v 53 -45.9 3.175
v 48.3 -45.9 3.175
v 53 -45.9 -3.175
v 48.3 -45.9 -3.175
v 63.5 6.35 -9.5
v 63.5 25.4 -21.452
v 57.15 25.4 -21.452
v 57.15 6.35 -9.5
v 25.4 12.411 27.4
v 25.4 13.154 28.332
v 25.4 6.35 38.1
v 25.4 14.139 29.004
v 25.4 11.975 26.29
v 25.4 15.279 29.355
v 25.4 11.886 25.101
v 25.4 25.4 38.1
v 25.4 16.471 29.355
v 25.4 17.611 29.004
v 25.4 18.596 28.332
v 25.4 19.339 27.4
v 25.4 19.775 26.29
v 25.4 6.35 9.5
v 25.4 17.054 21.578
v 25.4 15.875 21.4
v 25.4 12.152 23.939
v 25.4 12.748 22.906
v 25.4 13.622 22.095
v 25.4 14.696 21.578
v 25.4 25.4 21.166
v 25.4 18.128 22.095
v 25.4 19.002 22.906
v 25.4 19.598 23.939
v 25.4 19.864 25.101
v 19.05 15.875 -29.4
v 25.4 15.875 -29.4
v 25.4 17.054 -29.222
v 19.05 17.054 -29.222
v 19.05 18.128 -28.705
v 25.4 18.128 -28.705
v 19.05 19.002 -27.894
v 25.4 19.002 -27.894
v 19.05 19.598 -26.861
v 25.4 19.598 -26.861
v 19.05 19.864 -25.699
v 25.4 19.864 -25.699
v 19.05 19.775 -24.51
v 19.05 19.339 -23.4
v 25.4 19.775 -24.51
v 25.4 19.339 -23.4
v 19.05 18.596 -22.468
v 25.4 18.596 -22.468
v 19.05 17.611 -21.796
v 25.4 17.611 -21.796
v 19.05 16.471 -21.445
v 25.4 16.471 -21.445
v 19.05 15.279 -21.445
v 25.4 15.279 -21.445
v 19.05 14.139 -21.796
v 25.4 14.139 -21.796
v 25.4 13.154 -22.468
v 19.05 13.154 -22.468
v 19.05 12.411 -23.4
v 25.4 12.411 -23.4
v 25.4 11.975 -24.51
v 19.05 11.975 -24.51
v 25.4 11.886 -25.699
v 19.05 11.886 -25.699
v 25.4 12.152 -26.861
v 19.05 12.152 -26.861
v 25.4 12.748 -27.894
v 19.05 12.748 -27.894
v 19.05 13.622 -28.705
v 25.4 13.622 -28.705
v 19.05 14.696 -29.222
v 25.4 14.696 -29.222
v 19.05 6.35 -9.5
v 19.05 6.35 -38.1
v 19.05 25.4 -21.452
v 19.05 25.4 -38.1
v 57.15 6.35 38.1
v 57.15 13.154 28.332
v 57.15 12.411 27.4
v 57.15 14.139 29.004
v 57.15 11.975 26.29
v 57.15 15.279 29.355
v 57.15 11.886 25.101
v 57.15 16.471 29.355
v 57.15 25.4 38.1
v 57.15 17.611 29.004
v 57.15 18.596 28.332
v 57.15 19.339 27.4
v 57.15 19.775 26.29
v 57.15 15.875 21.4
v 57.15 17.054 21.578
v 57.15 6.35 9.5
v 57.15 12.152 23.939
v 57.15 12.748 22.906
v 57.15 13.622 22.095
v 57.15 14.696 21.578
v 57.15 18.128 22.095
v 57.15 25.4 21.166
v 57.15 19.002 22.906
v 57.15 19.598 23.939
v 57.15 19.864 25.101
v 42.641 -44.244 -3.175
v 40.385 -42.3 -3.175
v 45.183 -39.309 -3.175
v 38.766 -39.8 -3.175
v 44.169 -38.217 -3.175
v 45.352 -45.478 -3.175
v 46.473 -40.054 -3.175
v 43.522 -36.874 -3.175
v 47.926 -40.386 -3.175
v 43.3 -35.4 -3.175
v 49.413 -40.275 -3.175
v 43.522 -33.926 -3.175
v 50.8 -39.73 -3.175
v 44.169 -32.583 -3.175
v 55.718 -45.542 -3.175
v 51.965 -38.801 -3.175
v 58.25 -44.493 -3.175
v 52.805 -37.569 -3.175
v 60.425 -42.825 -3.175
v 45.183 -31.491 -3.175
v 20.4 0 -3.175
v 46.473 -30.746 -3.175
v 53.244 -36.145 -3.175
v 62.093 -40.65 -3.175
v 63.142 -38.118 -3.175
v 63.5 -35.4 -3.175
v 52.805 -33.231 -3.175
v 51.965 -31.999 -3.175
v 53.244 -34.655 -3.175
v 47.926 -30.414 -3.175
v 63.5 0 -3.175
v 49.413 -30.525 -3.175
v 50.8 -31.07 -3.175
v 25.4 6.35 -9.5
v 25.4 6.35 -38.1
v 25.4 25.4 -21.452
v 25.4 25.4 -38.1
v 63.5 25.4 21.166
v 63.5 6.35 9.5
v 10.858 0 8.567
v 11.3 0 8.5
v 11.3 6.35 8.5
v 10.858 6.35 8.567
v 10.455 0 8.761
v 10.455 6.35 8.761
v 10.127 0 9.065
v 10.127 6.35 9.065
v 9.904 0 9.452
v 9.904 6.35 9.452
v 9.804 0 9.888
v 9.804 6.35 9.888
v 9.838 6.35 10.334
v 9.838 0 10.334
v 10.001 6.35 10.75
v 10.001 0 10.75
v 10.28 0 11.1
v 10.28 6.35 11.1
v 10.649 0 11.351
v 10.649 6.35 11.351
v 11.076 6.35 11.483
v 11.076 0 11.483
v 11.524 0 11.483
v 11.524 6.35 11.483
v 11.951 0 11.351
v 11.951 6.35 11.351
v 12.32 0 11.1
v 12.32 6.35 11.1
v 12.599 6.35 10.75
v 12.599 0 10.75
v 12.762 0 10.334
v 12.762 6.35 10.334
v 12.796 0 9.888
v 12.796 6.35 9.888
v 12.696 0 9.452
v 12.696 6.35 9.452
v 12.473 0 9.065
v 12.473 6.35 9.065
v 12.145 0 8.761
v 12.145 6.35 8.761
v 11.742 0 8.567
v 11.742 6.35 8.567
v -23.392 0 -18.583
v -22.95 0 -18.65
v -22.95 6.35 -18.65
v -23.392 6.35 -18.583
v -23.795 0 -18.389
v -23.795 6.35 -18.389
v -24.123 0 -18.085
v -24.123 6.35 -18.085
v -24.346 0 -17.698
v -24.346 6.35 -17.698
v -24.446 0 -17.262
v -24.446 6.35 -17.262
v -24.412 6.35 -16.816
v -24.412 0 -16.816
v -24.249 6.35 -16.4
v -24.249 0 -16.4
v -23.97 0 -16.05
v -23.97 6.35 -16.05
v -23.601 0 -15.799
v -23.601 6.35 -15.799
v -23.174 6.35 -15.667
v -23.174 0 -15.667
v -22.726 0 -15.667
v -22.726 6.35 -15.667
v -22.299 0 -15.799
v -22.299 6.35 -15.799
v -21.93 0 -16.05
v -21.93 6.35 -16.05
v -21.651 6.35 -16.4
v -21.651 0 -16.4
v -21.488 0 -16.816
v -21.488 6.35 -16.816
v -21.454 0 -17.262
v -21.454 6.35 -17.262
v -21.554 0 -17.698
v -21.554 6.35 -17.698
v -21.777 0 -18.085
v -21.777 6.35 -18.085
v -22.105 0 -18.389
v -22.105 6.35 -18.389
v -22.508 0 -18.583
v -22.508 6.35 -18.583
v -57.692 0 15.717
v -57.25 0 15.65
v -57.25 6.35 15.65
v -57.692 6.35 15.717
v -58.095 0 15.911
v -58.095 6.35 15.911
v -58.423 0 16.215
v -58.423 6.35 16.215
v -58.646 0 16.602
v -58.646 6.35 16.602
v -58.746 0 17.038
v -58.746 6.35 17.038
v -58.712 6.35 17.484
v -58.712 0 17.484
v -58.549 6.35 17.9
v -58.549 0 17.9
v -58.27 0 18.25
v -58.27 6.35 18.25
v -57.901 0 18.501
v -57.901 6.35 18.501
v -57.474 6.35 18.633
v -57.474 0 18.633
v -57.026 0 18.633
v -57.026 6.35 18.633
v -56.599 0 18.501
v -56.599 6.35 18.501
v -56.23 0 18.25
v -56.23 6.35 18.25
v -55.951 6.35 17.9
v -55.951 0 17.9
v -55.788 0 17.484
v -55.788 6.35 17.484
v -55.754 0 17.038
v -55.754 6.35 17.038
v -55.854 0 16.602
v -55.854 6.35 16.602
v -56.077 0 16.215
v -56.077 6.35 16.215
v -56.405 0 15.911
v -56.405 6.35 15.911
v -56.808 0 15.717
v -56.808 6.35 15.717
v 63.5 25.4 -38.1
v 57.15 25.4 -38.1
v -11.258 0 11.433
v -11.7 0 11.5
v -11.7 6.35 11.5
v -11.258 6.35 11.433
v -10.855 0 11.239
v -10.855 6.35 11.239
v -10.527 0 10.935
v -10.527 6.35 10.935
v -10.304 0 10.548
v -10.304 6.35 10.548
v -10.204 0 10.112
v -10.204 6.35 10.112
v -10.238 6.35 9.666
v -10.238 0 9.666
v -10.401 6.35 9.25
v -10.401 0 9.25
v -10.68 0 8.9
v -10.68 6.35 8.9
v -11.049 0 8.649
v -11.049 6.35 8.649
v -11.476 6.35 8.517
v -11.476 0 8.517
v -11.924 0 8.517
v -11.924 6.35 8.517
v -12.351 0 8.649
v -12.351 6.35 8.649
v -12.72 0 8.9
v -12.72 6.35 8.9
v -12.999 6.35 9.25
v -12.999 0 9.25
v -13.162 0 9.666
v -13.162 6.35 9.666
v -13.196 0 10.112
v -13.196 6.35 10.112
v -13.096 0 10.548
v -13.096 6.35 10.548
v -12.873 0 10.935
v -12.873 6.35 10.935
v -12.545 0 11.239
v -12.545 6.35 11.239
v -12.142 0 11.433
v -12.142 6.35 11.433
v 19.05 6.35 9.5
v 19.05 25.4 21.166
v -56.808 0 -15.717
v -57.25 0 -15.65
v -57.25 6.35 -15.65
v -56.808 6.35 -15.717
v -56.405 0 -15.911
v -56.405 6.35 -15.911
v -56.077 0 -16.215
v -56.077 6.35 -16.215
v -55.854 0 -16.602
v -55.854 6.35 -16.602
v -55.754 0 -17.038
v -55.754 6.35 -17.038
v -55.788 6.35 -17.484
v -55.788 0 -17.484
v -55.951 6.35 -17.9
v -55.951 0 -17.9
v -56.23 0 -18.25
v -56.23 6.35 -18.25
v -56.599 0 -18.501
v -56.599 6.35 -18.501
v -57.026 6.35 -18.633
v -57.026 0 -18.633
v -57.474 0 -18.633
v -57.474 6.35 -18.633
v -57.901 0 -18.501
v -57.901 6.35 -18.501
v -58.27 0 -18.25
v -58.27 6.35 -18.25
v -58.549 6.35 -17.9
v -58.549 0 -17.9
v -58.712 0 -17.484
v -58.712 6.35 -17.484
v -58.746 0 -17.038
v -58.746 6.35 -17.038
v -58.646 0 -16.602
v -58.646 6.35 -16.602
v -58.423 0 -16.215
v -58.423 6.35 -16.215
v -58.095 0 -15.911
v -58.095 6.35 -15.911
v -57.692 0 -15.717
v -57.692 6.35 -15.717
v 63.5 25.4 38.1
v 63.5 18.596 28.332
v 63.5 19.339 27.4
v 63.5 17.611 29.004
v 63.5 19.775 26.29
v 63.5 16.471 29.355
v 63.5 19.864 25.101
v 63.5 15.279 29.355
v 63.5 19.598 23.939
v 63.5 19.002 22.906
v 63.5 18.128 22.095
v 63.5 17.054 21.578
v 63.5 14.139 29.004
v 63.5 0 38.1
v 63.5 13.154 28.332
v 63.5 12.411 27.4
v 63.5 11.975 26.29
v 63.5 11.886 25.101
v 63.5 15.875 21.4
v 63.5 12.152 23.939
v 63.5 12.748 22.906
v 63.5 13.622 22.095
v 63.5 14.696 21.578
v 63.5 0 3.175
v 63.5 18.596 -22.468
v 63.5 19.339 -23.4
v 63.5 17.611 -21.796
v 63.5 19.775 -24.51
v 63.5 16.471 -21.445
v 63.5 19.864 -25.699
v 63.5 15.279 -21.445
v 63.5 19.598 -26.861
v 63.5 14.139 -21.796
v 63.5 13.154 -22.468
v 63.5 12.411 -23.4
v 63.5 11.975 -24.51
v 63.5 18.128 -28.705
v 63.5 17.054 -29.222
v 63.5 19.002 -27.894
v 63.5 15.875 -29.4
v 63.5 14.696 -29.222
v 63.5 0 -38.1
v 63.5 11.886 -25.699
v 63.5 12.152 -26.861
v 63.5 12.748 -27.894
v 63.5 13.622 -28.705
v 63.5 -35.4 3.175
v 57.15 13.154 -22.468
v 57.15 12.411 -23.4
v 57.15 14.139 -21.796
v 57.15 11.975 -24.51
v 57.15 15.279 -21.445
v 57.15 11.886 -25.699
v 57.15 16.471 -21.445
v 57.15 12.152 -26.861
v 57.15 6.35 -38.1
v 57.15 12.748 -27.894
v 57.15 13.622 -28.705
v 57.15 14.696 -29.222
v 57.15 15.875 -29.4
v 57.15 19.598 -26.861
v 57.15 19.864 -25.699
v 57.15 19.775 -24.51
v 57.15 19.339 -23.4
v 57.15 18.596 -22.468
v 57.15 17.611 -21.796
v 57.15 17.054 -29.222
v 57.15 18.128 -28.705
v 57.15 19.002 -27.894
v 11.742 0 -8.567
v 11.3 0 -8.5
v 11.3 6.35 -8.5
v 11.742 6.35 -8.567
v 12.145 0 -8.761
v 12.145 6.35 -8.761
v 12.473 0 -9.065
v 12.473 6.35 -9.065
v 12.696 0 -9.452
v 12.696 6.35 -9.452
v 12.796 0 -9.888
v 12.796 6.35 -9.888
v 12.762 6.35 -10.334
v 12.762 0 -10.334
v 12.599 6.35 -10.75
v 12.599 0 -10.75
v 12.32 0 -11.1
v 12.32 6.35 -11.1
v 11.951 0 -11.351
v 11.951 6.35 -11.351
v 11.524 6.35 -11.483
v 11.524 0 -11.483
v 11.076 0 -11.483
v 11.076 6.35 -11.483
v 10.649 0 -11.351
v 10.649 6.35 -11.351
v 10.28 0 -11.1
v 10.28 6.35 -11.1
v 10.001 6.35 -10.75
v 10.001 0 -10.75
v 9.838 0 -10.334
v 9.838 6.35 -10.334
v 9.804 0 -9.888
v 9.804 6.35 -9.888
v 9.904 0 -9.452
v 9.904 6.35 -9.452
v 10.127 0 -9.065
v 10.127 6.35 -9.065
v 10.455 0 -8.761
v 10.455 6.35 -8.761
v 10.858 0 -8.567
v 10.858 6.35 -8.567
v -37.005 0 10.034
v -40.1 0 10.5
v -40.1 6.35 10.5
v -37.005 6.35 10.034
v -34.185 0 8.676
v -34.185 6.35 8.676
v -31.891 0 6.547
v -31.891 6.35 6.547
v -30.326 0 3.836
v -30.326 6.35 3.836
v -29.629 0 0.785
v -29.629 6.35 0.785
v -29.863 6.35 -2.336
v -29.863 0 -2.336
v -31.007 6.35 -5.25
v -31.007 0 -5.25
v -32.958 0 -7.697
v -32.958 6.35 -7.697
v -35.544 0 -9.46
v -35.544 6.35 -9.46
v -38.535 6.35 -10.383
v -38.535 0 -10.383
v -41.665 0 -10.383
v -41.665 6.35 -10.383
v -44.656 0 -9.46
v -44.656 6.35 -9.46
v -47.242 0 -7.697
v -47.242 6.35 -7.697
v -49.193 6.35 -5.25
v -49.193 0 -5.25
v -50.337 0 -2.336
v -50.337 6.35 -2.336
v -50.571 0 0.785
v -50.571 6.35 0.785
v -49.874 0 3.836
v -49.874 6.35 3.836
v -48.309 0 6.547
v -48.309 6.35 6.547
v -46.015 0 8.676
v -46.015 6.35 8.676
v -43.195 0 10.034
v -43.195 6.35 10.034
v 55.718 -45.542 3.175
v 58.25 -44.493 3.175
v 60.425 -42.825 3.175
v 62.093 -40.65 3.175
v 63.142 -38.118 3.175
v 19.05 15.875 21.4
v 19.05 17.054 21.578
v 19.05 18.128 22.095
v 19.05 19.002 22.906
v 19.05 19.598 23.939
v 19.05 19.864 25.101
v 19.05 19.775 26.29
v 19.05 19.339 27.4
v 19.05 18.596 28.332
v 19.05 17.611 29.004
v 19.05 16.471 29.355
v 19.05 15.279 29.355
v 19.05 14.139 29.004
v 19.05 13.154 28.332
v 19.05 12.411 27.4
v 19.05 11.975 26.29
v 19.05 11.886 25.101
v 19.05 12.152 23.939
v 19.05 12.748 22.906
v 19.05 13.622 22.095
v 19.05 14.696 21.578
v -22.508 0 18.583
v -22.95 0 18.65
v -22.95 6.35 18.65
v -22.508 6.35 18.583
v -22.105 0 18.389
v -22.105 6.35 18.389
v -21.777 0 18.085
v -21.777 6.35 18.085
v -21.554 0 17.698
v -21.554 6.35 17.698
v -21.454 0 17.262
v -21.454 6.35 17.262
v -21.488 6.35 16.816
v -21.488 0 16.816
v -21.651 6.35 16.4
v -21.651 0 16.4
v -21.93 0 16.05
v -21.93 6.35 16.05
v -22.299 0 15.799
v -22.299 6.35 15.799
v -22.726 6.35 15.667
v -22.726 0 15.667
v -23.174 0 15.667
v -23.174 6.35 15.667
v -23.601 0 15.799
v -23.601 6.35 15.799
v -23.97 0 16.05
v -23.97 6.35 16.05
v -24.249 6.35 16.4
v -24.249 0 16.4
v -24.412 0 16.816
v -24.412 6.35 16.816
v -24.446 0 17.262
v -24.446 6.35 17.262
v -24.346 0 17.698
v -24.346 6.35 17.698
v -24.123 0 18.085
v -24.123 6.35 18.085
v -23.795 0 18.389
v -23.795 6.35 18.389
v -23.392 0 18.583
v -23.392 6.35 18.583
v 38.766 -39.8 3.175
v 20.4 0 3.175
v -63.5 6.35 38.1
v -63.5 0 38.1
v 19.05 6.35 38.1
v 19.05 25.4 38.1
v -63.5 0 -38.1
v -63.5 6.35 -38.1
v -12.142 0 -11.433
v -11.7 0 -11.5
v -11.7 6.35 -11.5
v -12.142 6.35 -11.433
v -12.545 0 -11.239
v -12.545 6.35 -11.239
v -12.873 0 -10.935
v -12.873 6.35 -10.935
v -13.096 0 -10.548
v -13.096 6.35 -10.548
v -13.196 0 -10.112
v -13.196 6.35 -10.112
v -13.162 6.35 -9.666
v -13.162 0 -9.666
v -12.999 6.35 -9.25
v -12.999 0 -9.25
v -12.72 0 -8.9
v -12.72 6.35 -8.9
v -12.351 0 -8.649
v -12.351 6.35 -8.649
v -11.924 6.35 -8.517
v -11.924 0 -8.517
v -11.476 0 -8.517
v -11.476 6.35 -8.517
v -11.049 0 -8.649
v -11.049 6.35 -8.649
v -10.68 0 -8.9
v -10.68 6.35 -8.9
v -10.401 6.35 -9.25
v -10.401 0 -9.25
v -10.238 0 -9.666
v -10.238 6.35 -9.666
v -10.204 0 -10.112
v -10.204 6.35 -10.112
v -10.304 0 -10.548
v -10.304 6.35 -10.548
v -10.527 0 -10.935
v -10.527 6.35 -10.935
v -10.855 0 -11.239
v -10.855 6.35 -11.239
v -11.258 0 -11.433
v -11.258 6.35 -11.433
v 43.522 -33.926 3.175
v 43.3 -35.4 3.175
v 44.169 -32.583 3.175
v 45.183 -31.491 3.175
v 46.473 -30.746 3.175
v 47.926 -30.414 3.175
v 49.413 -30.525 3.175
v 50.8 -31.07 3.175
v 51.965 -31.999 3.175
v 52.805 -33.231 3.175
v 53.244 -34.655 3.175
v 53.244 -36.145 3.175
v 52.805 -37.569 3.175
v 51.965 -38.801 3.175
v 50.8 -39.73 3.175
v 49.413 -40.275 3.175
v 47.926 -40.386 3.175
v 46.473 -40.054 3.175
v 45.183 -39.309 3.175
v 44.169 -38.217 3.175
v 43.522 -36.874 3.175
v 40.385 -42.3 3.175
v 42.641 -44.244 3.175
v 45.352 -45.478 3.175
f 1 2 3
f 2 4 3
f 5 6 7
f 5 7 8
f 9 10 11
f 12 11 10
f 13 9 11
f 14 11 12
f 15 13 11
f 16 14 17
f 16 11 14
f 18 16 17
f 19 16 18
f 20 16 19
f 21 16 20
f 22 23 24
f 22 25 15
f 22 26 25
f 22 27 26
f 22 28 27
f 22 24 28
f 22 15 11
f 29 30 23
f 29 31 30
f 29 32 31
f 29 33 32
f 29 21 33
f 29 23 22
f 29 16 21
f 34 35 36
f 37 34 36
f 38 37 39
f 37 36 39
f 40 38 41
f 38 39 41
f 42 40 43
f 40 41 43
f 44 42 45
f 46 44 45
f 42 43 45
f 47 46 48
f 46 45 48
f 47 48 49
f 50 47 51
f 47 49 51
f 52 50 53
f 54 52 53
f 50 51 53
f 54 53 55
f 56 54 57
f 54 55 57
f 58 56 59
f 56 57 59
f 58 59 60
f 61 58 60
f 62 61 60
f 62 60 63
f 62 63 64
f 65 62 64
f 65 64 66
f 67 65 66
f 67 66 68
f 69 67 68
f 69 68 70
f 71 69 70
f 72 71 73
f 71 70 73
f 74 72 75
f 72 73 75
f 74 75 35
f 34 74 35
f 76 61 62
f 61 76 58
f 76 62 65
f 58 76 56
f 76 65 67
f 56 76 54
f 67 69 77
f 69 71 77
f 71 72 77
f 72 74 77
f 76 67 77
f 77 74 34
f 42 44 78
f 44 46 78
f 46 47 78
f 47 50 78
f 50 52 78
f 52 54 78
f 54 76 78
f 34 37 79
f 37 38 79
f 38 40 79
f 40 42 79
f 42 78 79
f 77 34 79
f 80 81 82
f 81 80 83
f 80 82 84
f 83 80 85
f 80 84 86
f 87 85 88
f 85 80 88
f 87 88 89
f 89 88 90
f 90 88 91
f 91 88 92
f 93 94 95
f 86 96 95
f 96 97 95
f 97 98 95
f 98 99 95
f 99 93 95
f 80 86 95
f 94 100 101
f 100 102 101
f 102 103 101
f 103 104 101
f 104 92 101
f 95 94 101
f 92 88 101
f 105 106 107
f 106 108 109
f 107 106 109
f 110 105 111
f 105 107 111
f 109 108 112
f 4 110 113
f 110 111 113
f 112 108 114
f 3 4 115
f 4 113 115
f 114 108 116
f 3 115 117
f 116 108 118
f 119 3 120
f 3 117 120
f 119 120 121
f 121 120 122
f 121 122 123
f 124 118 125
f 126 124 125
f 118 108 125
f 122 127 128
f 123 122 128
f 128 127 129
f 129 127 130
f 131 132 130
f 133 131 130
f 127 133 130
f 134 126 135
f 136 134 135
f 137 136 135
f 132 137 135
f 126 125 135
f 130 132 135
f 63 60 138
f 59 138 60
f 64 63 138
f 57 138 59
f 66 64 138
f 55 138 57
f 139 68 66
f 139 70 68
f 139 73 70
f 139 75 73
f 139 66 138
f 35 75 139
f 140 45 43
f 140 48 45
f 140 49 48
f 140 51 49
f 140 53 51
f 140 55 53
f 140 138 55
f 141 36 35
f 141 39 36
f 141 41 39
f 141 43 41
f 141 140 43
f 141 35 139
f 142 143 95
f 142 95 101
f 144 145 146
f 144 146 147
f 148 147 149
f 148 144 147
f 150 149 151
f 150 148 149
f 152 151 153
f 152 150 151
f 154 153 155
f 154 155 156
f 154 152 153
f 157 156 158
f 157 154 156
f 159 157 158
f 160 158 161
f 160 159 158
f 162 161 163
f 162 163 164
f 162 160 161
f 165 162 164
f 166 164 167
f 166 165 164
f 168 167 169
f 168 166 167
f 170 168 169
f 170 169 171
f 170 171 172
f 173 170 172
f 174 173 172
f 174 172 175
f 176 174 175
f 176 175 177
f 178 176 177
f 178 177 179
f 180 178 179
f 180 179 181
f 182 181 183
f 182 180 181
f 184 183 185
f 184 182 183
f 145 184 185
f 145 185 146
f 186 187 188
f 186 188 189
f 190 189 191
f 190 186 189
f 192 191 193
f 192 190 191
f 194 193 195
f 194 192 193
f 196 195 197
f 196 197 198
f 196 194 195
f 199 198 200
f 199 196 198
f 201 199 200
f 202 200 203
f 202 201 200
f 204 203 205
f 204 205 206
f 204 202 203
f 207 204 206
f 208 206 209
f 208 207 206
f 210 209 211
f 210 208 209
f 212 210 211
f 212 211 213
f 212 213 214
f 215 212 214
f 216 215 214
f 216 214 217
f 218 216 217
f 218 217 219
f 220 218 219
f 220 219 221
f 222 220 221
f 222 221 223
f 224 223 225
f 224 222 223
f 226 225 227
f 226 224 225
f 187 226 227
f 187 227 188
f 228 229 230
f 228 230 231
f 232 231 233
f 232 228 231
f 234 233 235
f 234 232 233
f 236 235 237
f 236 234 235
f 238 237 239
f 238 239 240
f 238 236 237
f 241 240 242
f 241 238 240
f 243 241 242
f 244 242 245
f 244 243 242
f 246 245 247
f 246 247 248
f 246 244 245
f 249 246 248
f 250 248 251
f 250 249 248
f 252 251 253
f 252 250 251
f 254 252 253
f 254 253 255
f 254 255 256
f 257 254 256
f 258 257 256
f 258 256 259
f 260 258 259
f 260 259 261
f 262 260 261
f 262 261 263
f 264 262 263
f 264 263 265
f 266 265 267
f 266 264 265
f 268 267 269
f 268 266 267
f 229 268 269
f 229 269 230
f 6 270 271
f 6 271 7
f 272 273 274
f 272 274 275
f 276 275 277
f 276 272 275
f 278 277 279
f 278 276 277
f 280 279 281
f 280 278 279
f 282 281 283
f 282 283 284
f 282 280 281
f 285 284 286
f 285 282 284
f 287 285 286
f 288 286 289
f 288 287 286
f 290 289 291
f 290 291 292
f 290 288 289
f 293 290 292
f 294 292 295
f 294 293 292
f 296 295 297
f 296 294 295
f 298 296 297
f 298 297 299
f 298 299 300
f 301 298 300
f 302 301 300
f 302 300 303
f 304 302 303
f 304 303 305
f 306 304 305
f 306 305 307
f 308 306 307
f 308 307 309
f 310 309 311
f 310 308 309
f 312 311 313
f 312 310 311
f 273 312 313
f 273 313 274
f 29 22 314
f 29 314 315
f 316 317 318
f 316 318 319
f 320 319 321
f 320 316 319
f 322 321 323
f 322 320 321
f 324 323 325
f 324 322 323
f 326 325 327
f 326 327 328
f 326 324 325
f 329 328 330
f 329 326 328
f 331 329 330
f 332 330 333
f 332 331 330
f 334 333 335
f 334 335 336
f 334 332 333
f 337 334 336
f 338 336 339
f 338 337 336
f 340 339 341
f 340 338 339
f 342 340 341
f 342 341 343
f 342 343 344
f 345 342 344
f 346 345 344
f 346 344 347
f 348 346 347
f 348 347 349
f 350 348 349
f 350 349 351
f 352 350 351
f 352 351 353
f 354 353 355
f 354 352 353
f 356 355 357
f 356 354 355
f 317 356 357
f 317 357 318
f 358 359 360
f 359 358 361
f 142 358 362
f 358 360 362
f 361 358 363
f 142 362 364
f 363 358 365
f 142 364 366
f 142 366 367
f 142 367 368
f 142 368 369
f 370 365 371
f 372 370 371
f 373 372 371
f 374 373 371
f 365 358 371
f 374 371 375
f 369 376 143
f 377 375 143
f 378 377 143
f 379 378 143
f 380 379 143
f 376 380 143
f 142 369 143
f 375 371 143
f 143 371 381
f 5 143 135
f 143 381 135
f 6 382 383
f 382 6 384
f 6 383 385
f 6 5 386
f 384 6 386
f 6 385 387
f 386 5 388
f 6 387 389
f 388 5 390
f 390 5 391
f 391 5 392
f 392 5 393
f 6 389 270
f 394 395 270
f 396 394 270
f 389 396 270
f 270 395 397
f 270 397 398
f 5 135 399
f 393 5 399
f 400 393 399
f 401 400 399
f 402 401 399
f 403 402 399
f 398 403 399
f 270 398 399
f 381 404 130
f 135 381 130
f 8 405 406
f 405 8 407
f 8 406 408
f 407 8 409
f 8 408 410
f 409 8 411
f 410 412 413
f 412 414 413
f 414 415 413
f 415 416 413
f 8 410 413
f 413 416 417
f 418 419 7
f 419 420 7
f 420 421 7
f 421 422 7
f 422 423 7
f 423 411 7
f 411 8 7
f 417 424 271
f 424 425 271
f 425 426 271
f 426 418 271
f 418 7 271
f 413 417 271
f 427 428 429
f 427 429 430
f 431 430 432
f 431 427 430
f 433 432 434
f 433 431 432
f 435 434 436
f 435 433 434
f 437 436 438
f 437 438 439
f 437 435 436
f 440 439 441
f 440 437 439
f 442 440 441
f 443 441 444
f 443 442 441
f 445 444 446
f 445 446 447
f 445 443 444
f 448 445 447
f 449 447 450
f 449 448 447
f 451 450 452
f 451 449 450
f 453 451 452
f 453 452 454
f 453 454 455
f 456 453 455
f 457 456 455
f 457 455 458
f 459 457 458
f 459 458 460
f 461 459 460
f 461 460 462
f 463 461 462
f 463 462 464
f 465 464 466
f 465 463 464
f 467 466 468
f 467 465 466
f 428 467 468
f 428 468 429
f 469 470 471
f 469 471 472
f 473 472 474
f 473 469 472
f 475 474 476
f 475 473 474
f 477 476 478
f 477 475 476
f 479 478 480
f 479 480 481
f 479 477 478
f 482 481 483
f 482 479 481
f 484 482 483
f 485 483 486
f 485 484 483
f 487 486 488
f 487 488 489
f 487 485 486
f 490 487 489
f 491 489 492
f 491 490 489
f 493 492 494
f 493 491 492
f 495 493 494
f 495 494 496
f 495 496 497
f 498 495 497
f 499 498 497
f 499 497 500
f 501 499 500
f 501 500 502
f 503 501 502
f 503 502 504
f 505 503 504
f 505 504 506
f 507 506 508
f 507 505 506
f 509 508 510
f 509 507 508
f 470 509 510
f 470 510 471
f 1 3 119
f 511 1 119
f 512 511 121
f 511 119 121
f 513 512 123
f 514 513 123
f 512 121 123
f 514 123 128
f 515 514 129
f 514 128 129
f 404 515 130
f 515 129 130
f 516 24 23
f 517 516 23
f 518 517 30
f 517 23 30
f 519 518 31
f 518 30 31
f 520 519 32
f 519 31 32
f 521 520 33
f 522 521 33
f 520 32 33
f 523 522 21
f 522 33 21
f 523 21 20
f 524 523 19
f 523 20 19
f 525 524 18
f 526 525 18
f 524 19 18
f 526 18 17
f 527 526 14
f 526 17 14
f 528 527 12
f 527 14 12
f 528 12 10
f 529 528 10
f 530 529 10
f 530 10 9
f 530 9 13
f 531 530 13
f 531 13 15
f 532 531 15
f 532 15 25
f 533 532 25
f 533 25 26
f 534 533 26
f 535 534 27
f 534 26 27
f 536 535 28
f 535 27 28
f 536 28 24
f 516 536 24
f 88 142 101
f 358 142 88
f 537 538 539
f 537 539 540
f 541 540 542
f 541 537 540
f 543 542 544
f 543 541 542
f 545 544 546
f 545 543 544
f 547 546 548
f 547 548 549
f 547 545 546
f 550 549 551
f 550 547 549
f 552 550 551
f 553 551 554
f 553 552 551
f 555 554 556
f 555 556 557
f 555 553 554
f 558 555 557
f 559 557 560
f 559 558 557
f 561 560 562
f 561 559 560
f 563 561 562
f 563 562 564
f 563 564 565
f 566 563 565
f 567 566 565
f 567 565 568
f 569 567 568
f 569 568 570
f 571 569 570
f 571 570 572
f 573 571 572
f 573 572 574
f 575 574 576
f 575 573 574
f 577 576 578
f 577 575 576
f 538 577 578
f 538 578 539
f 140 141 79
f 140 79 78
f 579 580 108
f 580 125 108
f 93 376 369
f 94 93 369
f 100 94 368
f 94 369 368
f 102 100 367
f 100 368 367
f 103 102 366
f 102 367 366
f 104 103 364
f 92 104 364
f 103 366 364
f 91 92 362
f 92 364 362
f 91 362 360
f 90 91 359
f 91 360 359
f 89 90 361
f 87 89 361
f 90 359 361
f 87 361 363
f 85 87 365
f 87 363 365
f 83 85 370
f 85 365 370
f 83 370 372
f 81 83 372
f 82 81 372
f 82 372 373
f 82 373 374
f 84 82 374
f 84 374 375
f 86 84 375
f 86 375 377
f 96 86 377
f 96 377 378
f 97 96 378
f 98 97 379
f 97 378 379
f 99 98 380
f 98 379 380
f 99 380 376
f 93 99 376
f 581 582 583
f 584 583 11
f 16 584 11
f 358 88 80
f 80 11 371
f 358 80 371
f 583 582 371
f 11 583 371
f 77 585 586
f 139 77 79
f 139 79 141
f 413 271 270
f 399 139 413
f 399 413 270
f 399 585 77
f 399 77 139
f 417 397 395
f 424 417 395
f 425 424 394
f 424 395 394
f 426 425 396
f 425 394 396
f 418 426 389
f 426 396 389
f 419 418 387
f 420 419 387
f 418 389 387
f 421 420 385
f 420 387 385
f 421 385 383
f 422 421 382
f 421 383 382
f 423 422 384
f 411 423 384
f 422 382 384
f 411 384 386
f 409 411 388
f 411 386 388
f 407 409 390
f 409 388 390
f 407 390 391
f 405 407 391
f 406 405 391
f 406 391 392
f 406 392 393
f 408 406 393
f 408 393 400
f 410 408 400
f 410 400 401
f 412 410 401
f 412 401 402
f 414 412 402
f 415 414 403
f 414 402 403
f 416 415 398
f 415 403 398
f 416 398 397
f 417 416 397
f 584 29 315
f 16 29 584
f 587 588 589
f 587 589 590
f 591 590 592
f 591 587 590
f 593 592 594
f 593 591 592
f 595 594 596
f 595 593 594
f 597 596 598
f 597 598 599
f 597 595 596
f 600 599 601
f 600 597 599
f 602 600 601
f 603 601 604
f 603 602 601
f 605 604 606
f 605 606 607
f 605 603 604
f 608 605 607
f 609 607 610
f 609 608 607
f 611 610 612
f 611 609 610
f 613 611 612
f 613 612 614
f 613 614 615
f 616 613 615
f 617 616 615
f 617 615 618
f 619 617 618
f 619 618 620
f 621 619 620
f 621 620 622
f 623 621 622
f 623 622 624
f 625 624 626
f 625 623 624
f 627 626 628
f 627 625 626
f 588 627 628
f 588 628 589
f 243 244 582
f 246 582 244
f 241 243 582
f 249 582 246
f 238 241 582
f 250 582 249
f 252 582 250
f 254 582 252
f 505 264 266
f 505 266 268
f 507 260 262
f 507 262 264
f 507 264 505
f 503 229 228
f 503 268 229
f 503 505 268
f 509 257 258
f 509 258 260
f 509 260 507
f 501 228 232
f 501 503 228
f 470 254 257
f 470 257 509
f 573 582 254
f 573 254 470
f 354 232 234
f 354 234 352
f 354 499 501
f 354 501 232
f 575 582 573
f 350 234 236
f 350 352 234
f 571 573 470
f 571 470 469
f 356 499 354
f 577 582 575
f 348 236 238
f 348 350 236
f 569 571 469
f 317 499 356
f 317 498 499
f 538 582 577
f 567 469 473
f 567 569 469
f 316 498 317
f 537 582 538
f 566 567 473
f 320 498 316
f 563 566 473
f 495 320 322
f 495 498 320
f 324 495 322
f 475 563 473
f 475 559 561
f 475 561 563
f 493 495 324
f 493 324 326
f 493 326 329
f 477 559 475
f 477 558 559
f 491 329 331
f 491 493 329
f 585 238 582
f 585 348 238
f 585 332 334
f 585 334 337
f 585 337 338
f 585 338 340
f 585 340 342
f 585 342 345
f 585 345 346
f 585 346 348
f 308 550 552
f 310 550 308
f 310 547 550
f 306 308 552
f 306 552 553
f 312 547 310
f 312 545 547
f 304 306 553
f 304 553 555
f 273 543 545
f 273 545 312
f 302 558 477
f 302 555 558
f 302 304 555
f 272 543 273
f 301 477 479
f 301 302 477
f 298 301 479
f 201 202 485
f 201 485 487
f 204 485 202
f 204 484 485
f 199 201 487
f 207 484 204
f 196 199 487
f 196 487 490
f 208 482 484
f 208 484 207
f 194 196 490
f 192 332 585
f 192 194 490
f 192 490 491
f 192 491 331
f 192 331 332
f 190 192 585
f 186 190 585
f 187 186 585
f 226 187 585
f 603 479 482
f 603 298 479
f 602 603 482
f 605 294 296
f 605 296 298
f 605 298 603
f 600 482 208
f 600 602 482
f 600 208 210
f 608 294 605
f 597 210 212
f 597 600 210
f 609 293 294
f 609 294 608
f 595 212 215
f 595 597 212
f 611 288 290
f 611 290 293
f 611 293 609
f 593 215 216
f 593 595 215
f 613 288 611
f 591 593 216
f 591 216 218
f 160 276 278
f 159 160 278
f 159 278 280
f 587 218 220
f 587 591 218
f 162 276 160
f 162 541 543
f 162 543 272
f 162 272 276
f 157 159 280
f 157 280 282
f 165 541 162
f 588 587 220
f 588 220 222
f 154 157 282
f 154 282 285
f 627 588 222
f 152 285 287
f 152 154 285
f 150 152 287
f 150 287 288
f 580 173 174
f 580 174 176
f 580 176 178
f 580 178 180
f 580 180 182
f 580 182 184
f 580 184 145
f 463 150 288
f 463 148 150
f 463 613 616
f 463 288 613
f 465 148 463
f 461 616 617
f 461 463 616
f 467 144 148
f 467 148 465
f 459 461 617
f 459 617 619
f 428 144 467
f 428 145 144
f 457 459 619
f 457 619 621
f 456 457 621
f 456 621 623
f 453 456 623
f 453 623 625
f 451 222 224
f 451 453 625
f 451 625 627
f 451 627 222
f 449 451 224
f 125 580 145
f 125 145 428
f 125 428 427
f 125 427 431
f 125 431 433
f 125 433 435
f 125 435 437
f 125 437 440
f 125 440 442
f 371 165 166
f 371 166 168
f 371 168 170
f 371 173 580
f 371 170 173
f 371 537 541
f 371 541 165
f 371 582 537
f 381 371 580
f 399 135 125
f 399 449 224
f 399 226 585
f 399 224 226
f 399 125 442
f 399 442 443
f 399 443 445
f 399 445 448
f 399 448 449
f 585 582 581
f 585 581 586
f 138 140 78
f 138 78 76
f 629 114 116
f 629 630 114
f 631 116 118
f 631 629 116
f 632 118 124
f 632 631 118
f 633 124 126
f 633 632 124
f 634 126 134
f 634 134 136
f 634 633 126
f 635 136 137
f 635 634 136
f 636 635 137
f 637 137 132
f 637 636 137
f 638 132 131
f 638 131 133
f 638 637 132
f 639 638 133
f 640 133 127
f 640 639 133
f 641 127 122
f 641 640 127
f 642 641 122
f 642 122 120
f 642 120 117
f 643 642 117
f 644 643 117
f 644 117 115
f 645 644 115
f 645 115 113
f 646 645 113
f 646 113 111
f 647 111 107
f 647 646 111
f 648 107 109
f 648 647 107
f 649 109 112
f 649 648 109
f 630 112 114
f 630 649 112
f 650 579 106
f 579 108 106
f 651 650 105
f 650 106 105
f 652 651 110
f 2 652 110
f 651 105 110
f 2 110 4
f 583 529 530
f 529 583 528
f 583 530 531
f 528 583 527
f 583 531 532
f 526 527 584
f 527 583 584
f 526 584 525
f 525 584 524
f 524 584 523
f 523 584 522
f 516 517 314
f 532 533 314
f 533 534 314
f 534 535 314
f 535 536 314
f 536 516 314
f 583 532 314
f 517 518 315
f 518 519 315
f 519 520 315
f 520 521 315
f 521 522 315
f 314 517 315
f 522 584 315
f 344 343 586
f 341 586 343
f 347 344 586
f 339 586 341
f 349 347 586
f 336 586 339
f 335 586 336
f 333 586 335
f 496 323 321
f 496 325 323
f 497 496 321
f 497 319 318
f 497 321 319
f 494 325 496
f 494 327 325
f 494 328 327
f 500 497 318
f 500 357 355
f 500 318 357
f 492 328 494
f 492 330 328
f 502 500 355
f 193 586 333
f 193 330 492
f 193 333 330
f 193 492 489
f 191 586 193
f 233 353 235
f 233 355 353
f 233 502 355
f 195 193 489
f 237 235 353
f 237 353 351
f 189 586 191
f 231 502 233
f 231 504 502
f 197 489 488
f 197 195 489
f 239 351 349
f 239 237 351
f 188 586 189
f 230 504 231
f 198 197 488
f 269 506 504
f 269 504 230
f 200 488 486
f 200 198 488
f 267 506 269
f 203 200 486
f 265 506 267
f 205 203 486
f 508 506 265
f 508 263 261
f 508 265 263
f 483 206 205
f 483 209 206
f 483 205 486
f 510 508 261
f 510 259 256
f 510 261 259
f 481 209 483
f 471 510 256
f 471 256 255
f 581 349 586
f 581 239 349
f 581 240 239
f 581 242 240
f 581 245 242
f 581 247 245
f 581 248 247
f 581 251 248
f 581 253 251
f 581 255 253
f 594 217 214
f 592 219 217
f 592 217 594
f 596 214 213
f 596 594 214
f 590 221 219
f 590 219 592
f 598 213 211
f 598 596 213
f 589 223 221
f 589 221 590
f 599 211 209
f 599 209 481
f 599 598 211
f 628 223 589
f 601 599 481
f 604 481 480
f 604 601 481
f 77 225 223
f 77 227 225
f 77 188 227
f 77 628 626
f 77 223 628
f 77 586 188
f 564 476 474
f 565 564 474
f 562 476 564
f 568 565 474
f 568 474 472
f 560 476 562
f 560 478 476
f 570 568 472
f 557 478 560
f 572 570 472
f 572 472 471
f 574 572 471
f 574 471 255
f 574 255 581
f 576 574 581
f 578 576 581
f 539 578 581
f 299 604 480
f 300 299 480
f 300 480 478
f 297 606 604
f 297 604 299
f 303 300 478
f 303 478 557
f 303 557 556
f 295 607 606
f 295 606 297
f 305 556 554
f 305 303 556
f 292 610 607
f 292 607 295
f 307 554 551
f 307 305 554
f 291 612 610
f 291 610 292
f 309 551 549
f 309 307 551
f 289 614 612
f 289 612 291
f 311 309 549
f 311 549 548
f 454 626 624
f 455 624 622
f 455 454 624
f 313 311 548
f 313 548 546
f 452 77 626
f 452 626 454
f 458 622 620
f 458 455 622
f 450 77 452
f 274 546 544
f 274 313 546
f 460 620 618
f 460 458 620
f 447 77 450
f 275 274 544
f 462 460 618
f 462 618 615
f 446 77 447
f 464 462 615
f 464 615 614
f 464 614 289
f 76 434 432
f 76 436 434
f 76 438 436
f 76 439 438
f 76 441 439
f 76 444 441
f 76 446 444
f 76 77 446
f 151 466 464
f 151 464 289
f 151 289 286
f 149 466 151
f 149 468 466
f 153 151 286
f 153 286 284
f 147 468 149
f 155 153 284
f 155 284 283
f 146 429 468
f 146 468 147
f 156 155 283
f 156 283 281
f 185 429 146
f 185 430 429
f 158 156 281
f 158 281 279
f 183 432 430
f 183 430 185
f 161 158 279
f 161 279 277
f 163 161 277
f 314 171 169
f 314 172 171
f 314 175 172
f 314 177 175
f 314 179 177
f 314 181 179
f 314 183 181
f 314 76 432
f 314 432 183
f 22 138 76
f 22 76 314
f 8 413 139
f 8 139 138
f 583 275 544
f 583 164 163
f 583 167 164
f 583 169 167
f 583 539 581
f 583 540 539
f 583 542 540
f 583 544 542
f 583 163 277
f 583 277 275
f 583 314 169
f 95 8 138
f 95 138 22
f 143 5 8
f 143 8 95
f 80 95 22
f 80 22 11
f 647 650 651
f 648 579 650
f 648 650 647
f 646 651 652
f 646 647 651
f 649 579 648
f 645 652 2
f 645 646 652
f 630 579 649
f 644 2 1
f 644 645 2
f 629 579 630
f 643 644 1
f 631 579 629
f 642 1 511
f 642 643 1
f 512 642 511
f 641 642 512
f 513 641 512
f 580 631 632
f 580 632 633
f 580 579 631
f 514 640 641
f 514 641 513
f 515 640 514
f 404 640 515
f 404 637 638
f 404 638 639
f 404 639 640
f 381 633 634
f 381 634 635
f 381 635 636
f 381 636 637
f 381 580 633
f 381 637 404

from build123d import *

# Parameters (mm, degrees)
SKETCH2_W           = 127
SKETCH2_H           = 76.2
SKETCH2_R           = 10.5
SKETCH2_R_2         = 1.5
BOSS_EXTRUDE1_DEPTH = 6.35
SKETCH3_R           = 4
BOSS_EXTRUDE2_DEPTH = 6.35
LPATTERN1_COUNT     = 2
LPATTERN1_PITCH     = 38.1
BOSS_EXTRUDE3_START = -38.1
SKETCH4_R           = 5
BOSS_EXTRUDE3_DEPTH = 3.175


with BuildPart() as part:
    # Sketch2 → Boss-Extrude1 (new body)
    with BuildSketch(Plane(origin=(0, 0, 0), x_dir=(1, 0, 0), z_dir=(0, 1, 0))):
        Rectangle(SKETCH2_W, SKETCH2_H)
        with Locations(Location((-40.1, 0, 0), (0, 0, 270))):
            Circle(SKETCH2_R, mode=Mode.SUBTRACT)
        with Locations(Location((11.3, 10, 0), (0, 0, 270))):
            Circle(SKETCH2_R_2, mode=Mode.SUBTRACT)
        with Locations(Location((-57.25, 17.15, 0), (0, 0, 270))):
            Circle(SKETCH2_R_2, mode=Mode.SUBTRACT)
        with Locations(Location((-57.25, -17.15, 0), (0, 0, 90))):
            Circle(SKETCH2_R_2, mode=Mode.SUBTRACT)
        with Locations(Location((-11.7, 10, 0), (0, 0, 90))):
            Circle(SKETCH2_R_2, mode=Mode.SUBTRACT)
        with Locations(Location((-22.95, -17.15, 0), (0, 0, 270))):
            Circle(SKETCH2_R_2, mode=Mode.SUBTRACT)
        with Locations(Location((-22.95, 17.15, 0), (0, 0, 90))):
            Circle(SKETCH2_R_2, mode=Mode.SUBTRACT)
        with Locations(Location((11.3, -10, 0), (0, 0, 90))):
            Circle(SKETCH2_R_2, mode=Mode.SUBTRACT)
        with Locations(Location((-11.7, -10, 0), (0, 0, 270))):
            Circle(SKETCH2_R_2, mode=Mode.SUBTRACT)
    extrude(amount=BOSS_EXTRUDE1_DEPTH)

    # Sketch3 → Boss-Extrude2 (add)
    with BuildSketch(Plane(origin=(63.5, 0, 0), x_dir=(0, 0, -1), z_dir=(1, 0, 0))):
        Polygon((-38.1, 0), (38.1, 0), (38.1, 25.4), (21.451862696, 25.4), (9.5, 6.35), (-9.5, 6.35), (-21.165528848, 25.4), (-38.1, 25.4), align=None)
        with Locations((-25.4, 15.875)):
            Circle(SKETCH3_R, mode=Mode.SUBTRACT)
        with Locations((25.4, 15.875)):
            Circle(SKETCH3_R, mode=Mode.SUBTRACT)
    boss_extrude2 = extrude(amount=-BOSS_EXTRUDE2_DEPTH)

    # LPattern1: Boss-Extrude2 ×2
    with Locations(*[(-i * LPATTERN1_PITCH, 0, 0) for i in range(1, LPATTERN1_COUNT)]):
        add(boss_extrude2)

    # Sketch4 → Boss-Extrude3 (add, symmetric)
    with BuildSketch(Plane(origin=(0, 0, -38.1), x_dir=(-1, 0, 0), z_dir=(0, 0, -1)).offset(BOSS_EXTRUDE3_START)):
        with BuildLine():
            Line((-63.5, 0), (-20.400000165, 0))
            Line((-20.400000165, 0), (-38.766166206, -39.799546929))
            ThreePointArc((-38.766166206, -39.799546929), (-42.640726317, -44.24435534), (-48.3, -45.9))
            Line((-48.3, -45.9), (-53, -45.9))
            ThreePointArc((-53, -45.9), (-60.424621202, -42.824621202), (-63.5, -35.4))
            Line((-63.5, -35.4), (-63.5, 0))
        make_face()
        with Locations((-48.3, -35.4)):
            Circle(SKETCH4_R, mode=Mode.SUBTRACT)
    extrude(amount=BOSS_EXTRUDE3_DEPTH, both=True)


solid = part.part
